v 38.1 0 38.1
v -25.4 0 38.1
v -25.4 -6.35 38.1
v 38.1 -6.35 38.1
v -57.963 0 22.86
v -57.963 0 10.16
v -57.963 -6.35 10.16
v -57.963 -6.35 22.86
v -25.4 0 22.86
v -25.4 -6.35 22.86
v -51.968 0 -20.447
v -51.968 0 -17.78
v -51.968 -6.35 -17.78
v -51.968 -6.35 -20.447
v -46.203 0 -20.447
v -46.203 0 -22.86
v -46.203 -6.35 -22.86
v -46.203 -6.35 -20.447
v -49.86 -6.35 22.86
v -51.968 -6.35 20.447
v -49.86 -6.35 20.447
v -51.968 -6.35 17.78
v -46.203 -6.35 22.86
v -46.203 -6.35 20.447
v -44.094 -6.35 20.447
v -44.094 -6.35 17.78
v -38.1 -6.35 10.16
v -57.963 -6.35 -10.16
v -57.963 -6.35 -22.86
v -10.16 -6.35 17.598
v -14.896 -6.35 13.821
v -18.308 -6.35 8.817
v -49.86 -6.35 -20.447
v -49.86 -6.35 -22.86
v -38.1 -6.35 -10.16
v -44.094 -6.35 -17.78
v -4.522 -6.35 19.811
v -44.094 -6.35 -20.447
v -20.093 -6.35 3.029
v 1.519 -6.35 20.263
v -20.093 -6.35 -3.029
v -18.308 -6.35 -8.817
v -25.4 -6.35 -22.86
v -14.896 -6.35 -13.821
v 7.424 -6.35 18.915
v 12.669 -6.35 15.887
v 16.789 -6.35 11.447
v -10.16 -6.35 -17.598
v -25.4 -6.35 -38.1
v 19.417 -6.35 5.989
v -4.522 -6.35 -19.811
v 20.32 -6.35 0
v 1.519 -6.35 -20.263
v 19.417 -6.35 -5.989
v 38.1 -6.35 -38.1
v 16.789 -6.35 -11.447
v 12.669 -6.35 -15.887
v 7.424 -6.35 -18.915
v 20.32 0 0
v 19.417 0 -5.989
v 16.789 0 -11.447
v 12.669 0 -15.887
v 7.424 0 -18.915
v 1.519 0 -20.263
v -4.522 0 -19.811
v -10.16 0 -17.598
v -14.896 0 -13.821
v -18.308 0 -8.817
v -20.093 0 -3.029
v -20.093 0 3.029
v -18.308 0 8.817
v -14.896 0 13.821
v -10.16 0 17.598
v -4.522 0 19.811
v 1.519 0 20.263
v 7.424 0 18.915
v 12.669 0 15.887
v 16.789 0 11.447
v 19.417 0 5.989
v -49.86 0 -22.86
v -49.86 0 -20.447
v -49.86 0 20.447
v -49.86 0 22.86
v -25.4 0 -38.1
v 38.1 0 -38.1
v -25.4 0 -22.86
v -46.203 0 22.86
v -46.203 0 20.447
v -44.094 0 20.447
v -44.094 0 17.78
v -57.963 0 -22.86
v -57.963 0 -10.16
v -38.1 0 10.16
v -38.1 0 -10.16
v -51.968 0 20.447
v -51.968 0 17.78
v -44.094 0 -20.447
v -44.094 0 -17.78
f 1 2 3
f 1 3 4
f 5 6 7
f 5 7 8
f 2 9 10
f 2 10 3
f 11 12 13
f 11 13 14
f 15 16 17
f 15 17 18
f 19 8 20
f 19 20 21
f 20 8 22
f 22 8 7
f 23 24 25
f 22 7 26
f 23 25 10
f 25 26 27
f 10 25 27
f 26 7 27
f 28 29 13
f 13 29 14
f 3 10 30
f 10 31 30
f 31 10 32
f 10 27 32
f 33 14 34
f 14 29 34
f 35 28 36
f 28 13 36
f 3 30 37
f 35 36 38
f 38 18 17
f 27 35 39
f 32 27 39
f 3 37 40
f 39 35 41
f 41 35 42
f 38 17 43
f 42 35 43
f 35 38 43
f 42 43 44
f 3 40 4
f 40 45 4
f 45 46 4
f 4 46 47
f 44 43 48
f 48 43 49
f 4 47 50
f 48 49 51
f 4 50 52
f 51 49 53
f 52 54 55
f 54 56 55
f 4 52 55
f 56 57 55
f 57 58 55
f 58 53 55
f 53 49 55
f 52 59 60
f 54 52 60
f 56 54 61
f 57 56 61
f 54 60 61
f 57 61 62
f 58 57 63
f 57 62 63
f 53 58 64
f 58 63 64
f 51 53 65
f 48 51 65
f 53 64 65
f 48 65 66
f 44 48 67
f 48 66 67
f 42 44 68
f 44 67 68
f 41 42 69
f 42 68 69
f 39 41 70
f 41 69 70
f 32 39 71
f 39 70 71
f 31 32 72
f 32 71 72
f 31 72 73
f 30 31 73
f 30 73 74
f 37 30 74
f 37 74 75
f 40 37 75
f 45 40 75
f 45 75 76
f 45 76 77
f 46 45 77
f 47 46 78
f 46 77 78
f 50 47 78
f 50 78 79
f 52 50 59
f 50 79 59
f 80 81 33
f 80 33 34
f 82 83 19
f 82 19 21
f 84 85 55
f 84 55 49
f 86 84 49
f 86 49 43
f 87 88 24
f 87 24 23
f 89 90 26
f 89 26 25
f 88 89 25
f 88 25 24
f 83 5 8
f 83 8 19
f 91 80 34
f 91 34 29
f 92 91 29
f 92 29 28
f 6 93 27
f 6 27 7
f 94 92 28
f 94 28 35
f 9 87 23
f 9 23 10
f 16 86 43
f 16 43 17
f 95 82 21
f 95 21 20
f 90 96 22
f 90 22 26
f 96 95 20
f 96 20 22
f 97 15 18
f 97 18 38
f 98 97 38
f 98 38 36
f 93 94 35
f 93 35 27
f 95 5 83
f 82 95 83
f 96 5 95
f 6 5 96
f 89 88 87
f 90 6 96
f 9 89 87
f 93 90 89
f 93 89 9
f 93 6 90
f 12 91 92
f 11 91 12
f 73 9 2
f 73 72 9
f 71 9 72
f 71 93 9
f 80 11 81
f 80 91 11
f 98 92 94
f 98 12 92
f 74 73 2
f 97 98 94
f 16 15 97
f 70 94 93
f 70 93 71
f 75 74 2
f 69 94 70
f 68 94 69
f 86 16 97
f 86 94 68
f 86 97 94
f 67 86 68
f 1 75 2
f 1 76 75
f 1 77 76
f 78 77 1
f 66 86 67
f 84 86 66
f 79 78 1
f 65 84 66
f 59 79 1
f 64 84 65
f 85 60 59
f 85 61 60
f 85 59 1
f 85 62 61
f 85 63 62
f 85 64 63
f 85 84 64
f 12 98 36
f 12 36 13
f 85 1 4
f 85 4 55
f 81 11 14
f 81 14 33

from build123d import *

# Parameters (mm, degrees)
SKETCH1_R           = 20.32
BOSS_EXTRUDE1_DEPTH = 6.35


with BuildPart() as part:
    # Sketch1 → Boss-Extrude1 (new body)
    with BuildSketch(Plane(origin=(0, 0, 0), x_dir=(1, 0, 0), z_dir=(0, 1, 0))):
        Polygon((-25.4, -38.1), (38.1, -38.1), (38.1, 38.1), (-25.4, 38.1), (-25.4, 22.86), (-38.1, 22.86), (-46.2026, 22.86), (-46.2026, 20.447), (-44.0944, 20.447), (-44.0944, 17.78), (-51.9684, 17.78), (-51.9684, 20.447), (-49.8602, 20.447), (-49.8602, 22.86), (-57.9628, 22.86), (-57.9628, 10.16), (-38.1, 10.16), (-38.1, -10.16), (-57.9628, -10.16), (-57.9628, -22.86), (-49.8602, -22.86), (-49.8602, -20.447), (-51.9684, -20.447), (-51.9684, -17.78), (-44.0944, -17.78), (-44.0944, -20.447), (-46.2026, -20.447), (-46.2026, -22.86), (-38.1, -22.86), (-25.4, -22.86), align=None)
        Circle(SKETCH1_R, mode=Mode.SUBTRACT)
    extrude(amount=-BOSS_EXTRUDE1_DEPTH)


solid = part.part
